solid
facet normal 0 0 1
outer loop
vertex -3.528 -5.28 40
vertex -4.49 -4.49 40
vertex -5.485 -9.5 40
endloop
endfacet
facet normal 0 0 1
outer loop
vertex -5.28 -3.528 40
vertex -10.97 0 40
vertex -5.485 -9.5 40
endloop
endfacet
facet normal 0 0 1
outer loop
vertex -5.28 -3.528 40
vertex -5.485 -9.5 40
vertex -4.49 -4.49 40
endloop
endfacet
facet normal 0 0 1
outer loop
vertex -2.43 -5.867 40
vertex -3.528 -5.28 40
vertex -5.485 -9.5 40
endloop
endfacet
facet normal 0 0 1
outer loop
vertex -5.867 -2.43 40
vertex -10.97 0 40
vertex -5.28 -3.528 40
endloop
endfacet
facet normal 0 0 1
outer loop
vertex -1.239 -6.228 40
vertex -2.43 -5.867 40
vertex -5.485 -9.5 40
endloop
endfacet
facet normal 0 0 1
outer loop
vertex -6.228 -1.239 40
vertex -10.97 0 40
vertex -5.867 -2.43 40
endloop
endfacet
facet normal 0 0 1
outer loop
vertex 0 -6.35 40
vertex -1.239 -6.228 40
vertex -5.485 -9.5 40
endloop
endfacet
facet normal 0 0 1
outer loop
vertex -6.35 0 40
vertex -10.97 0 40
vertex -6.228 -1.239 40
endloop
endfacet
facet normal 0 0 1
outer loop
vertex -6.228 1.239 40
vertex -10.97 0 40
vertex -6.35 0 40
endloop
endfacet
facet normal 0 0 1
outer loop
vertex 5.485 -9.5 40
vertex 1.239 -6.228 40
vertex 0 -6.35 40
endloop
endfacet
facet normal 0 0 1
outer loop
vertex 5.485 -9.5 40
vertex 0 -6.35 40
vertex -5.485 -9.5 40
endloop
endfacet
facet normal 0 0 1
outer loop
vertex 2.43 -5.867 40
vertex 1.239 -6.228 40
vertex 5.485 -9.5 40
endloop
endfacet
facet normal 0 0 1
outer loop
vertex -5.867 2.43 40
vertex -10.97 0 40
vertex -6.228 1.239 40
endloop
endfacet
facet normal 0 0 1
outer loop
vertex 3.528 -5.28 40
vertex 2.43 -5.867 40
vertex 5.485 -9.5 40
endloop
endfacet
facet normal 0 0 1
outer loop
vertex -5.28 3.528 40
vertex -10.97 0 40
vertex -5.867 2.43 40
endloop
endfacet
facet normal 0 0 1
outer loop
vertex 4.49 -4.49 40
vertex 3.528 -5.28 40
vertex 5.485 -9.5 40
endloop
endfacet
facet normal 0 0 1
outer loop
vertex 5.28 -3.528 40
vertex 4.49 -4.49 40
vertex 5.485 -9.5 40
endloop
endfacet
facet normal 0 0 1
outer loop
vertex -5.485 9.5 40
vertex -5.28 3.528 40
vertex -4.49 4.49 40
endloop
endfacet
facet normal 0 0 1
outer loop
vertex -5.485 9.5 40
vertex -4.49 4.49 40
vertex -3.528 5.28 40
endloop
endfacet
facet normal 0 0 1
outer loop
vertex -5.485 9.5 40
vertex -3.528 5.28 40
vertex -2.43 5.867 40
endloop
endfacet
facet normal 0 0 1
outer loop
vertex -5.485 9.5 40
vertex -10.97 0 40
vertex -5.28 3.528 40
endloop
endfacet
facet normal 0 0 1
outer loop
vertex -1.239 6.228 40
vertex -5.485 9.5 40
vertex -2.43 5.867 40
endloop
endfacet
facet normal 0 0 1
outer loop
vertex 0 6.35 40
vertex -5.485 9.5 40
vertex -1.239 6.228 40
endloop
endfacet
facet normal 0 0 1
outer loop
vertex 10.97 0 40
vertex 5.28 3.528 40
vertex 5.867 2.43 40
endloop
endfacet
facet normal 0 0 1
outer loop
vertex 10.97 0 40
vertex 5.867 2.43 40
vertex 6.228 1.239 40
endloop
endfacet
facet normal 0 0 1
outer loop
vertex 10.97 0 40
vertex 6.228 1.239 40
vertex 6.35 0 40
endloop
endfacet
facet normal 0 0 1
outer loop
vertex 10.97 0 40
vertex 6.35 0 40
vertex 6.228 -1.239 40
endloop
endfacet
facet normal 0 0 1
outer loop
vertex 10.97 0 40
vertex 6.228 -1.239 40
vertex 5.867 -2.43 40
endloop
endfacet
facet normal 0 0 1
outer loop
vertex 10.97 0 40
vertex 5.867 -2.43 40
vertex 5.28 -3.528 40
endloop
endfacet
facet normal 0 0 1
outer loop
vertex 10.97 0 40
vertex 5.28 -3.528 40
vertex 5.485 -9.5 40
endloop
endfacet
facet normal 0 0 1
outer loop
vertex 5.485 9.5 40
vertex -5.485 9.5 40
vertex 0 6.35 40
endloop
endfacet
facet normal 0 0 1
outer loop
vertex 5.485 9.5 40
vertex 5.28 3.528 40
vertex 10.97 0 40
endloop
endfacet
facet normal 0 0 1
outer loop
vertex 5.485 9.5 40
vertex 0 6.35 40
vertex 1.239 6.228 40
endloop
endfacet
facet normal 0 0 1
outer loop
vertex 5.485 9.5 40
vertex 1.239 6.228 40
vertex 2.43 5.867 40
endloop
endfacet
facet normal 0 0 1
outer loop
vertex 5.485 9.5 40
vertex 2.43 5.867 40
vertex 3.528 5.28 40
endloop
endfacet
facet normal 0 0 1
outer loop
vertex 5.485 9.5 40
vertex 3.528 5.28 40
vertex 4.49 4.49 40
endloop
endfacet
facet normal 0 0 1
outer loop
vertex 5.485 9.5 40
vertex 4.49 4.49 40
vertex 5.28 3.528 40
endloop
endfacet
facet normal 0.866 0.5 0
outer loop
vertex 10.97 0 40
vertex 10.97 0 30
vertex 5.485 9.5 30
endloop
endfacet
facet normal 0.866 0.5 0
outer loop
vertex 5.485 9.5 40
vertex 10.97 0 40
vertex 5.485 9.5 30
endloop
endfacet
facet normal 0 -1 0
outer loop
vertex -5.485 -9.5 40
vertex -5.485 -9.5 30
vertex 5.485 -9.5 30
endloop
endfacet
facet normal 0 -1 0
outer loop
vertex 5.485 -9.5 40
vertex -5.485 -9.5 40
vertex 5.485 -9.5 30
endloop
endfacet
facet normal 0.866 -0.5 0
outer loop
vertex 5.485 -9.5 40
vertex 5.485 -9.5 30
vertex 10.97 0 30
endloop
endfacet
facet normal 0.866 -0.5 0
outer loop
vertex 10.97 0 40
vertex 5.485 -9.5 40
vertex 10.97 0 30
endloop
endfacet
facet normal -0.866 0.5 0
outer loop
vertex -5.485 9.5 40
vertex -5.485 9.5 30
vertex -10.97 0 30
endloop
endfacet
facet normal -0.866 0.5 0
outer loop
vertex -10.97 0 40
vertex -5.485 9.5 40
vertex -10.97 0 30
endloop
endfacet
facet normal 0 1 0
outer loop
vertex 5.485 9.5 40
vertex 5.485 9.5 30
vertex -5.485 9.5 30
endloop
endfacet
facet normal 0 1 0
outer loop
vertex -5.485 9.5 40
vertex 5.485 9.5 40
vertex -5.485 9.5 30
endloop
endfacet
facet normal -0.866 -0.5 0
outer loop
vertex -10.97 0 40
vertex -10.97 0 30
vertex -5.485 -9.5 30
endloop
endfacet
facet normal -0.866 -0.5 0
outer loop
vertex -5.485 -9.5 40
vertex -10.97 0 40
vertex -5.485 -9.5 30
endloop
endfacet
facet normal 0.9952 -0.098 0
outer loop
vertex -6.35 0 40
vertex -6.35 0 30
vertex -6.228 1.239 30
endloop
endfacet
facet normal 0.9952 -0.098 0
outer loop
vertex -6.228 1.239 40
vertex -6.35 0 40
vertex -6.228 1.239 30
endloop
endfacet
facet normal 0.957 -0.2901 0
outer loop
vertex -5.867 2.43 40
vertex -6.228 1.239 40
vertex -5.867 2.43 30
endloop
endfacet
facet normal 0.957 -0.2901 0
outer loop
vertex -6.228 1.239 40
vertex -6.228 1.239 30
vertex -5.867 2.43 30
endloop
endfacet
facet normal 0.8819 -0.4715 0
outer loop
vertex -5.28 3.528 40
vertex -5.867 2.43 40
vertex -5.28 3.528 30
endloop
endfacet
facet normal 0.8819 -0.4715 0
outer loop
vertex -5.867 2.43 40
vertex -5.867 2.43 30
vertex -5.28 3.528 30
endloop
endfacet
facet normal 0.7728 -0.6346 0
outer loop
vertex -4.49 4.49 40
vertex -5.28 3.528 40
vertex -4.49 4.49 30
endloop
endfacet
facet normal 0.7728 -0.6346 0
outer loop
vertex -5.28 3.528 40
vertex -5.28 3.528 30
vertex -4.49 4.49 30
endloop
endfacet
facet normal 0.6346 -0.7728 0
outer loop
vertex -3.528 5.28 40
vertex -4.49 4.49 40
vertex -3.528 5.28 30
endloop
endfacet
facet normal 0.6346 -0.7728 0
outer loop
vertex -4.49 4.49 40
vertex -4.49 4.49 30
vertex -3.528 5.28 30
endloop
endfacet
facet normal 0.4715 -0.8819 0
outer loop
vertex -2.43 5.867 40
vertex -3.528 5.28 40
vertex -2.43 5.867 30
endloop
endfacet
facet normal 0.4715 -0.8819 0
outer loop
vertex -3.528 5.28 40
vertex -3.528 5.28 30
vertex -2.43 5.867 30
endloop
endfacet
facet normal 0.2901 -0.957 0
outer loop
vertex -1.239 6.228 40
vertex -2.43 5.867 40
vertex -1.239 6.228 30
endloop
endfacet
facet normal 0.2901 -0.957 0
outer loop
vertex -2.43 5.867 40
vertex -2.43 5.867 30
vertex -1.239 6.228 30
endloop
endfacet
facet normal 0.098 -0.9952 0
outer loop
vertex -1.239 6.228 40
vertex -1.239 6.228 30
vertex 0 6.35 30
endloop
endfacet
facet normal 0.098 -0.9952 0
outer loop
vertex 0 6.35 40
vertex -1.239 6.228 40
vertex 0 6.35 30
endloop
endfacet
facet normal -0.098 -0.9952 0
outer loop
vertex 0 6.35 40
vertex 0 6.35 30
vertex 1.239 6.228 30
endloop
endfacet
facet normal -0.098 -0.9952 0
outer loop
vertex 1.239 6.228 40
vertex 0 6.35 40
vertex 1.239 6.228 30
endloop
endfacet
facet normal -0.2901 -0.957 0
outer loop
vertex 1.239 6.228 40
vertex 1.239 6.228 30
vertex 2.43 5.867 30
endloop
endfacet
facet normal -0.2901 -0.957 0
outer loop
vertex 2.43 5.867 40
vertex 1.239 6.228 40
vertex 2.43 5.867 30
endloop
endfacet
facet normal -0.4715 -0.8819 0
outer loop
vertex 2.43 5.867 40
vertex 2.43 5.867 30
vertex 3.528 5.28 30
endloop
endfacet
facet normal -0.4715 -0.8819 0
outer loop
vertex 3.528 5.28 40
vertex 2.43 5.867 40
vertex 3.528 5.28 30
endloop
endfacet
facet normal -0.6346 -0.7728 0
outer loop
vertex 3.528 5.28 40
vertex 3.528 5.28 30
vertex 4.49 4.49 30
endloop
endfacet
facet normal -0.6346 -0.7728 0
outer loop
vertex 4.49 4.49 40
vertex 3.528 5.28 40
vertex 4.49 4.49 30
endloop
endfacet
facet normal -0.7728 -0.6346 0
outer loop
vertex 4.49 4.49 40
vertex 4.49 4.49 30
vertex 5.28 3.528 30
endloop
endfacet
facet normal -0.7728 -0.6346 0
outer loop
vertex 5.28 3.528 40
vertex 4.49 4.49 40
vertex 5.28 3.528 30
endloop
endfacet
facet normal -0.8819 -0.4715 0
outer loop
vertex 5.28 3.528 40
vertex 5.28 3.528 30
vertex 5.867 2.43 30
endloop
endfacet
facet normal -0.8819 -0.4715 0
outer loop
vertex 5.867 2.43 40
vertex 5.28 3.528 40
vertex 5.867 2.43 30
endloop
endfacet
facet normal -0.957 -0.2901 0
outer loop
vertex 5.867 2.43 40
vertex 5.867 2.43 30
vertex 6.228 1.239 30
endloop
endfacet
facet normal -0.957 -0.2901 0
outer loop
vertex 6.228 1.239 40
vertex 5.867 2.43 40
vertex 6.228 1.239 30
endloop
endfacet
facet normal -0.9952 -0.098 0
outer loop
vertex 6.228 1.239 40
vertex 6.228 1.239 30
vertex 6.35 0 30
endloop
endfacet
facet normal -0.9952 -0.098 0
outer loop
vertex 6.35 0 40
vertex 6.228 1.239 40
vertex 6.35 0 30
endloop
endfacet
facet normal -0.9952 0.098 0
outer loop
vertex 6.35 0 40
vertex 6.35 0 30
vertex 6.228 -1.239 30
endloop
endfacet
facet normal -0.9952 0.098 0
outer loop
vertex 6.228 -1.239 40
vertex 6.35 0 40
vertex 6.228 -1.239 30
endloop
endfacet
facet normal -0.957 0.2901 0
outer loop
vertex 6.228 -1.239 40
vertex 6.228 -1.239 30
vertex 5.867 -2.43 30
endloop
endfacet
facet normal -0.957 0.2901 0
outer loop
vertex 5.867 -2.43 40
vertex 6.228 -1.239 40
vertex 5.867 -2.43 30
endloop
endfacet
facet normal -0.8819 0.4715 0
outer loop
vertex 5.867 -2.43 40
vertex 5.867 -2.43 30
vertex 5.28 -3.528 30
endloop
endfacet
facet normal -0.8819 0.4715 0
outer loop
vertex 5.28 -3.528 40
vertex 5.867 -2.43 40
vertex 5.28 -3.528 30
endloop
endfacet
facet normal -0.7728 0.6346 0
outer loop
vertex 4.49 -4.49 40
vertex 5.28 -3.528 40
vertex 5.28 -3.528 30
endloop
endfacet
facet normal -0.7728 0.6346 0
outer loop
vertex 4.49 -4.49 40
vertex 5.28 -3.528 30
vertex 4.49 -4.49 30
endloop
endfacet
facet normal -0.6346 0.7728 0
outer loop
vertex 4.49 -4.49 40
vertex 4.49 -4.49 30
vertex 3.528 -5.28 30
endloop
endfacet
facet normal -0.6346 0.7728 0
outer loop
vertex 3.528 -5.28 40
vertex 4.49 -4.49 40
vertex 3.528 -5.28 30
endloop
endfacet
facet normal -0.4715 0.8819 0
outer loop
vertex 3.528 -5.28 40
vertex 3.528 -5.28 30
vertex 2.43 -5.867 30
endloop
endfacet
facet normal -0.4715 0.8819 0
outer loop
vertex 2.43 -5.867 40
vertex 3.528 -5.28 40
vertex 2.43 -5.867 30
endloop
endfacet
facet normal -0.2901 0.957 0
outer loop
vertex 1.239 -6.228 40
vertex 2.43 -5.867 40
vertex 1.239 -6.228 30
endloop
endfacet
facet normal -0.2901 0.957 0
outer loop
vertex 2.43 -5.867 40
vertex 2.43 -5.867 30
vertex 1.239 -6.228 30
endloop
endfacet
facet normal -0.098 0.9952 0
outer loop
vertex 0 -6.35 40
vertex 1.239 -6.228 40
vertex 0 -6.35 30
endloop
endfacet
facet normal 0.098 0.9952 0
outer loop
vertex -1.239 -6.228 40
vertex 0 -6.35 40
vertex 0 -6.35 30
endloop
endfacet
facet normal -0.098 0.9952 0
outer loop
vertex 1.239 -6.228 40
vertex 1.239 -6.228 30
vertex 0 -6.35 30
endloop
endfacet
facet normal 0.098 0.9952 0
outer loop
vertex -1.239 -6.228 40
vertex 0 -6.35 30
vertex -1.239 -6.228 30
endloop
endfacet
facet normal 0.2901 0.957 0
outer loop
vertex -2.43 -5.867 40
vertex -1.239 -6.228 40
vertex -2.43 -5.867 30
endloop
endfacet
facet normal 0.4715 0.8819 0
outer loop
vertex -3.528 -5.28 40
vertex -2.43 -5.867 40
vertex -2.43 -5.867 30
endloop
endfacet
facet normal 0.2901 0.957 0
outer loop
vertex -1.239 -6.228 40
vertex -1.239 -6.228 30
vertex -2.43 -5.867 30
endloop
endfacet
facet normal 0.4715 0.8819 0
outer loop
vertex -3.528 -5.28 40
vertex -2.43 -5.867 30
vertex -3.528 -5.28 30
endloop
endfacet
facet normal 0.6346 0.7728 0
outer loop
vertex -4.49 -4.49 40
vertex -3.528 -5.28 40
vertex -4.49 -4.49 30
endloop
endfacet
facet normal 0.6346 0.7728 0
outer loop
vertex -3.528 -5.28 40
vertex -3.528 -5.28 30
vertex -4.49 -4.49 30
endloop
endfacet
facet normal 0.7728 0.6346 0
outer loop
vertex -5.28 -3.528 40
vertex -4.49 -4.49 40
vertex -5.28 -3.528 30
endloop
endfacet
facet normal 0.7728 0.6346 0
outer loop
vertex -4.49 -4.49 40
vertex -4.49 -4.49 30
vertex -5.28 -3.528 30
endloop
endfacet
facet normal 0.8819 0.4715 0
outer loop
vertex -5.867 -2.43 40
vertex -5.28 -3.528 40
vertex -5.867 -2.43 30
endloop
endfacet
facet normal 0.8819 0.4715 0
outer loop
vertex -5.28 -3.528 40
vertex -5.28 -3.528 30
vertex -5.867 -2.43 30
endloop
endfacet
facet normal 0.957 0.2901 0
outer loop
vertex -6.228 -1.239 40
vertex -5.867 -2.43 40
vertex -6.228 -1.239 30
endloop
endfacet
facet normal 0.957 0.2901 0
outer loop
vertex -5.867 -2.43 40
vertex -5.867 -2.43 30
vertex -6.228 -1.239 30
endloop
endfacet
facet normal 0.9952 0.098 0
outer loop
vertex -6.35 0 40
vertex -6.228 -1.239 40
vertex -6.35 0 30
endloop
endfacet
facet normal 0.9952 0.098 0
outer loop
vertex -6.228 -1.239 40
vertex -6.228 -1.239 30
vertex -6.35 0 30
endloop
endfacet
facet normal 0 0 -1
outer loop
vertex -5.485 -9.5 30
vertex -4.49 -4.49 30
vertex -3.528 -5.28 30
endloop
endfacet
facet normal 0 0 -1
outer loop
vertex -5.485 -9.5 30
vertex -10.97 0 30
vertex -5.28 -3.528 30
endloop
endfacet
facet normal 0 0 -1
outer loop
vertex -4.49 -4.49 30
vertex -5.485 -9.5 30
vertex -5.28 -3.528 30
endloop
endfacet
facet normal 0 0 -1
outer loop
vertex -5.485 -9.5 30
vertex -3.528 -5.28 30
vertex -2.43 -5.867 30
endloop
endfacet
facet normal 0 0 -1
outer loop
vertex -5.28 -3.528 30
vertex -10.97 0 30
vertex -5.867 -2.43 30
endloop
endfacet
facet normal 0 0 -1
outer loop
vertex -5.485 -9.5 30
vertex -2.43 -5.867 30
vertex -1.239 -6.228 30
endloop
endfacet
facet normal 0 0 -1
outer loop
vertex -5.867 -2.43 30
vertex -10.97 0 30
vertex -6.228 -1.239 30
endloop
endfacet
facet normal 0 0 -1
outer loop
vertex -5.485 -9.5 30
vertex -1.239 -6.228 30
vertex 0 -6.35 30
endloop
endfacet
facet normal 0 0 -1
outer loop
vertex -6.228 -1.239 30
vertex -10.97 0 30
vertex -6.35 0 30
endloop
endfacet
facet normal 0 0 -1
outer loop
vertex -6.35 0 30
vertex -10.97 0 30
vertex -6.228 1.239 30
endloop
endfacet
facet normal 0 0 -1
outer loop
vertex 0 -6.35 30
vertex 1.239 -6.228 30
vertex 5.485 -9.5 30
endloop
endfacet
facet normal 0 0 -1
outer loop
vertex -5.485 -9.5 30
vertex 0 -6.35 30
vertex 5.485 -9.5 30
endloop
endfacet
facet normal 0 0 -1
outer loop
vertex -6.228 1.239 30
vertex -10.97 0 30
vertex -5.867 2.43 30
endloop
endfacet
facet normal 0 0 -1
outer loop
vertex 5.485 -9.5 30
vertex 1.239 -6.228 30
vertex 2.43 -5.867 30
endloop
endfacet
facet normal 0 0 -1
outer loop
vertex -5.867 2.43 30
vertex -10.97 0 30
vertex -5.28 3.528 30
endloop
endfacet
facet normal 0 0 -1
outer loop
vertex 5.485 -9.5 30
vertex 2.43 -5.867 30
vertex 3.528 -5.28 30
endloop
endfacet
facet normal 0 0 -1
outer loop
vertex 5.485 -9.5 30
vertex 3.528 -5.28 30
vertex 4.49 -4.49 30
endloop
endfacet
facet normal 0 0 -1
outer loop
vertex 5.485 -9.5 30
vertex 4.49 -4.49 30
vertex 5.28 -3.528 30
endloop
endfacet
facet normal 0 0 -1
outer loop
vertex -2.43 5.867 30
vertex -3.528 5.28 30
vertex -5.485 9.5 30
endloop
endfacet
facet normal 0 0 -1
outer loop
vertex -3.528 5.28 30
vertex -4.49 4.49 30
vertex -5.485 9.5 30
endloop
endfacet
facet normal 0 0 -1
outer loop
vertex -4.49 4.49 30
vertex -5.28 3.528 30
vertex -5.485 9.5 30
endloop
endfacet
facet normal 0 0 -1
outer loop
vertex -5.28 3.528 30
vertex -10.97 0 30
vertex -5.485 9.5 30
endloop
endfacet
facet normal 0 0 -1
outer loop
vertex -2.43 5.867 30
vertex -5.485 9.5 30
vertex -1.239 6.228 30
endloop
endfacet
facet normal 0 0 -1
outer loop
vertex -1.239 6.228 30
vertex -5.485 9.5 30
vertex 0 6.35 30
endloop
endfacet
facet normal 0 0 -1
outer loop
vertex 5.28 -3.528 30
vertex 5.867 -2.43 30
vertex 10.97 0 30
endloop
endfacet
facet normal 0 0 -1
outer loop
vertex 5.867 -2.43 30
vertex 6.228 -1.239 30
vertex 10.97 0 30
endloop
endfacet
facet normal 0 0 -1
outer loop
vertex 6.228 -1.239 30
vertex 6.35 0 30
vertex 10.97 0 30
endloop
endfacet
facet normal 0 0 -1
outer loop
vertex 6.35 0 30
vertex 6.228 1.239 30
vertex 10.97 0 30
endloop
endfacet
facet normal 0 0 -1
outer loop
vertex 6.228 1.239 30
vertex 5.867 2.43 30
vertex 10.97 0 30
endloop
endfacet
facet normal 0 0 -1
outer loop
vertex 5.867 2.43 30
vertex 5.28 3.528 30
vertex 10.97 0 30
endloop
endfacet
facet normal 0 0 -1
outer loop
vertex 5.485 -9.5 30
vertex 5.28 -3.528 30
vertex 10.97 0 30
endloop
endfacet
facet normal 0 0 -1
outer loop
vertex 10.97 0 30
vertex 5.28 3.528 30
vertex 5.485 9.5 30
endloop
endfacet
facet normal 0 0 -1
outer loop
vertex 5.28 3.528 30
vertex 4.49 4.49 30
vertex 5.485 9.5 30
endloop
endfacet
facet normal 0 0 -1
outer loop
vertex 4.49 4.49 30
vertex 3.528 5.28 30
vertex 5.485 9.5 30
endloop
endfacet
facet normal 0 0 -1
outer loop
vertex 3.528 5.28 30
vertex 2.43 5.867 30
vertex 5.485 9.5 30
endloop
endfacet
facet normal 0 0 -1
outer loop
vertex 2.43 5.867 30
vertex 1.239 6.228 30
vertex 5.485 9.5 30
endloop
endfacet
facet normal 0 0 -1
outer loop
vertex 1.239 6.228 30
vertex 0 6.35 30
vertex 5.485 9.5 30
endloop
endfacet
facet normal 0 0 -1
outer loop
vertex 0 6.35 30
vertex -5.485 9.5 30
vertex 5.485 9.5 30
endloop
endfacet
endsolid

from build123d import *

# Parameters (mm, degrees)
CROQUIS1_R              = 6.35
SALIENTE_EXTRUIR1_DEPTH = 30
SALIENTE_EXTRUIR2_DEPTH = 10
CROQUIS4_R              = 6.35
CORTAR_EXTRUIR1_DEPTH   = 43.550949852


with BuildPart() as part:
    # Croquis1 → Saliente-Extruir1 (new body)
    with BuildSketch(Plane.XY):
        Circle(CROQUIS1_R)
    extrude(amount=SALIENTE_EXTRUIR1_DEPTH)

    # Croquis2 → Saliente-Extruir2 (add)
    with BuildSketch(Plane.XY.offset(30)):
        Polygon((10.969655115, 0), (5.484827557, 9.5), (-5.484827557, 9.5), (-10.969655115, 0), (-5.484827557, -9.5), (5.484827557, -9.5), align=None)
    extrude(amount=SALIENTE_EXTRUIR2_DEPTH)

    # Croquis4 → Cortar-Extruir1 (cut, through all)
    with BuildSketch(Plane(origin=(0, 0, 0), x_dir=(-1, 0, 0), z_dir=(0, 0, -1))):
        Circle(CROQUIS4_R)
    extrude(amount=-CORTAR_EXTRUIR1_DEPTH, mode=Mode.SUBTRACT)


solid = part.part
